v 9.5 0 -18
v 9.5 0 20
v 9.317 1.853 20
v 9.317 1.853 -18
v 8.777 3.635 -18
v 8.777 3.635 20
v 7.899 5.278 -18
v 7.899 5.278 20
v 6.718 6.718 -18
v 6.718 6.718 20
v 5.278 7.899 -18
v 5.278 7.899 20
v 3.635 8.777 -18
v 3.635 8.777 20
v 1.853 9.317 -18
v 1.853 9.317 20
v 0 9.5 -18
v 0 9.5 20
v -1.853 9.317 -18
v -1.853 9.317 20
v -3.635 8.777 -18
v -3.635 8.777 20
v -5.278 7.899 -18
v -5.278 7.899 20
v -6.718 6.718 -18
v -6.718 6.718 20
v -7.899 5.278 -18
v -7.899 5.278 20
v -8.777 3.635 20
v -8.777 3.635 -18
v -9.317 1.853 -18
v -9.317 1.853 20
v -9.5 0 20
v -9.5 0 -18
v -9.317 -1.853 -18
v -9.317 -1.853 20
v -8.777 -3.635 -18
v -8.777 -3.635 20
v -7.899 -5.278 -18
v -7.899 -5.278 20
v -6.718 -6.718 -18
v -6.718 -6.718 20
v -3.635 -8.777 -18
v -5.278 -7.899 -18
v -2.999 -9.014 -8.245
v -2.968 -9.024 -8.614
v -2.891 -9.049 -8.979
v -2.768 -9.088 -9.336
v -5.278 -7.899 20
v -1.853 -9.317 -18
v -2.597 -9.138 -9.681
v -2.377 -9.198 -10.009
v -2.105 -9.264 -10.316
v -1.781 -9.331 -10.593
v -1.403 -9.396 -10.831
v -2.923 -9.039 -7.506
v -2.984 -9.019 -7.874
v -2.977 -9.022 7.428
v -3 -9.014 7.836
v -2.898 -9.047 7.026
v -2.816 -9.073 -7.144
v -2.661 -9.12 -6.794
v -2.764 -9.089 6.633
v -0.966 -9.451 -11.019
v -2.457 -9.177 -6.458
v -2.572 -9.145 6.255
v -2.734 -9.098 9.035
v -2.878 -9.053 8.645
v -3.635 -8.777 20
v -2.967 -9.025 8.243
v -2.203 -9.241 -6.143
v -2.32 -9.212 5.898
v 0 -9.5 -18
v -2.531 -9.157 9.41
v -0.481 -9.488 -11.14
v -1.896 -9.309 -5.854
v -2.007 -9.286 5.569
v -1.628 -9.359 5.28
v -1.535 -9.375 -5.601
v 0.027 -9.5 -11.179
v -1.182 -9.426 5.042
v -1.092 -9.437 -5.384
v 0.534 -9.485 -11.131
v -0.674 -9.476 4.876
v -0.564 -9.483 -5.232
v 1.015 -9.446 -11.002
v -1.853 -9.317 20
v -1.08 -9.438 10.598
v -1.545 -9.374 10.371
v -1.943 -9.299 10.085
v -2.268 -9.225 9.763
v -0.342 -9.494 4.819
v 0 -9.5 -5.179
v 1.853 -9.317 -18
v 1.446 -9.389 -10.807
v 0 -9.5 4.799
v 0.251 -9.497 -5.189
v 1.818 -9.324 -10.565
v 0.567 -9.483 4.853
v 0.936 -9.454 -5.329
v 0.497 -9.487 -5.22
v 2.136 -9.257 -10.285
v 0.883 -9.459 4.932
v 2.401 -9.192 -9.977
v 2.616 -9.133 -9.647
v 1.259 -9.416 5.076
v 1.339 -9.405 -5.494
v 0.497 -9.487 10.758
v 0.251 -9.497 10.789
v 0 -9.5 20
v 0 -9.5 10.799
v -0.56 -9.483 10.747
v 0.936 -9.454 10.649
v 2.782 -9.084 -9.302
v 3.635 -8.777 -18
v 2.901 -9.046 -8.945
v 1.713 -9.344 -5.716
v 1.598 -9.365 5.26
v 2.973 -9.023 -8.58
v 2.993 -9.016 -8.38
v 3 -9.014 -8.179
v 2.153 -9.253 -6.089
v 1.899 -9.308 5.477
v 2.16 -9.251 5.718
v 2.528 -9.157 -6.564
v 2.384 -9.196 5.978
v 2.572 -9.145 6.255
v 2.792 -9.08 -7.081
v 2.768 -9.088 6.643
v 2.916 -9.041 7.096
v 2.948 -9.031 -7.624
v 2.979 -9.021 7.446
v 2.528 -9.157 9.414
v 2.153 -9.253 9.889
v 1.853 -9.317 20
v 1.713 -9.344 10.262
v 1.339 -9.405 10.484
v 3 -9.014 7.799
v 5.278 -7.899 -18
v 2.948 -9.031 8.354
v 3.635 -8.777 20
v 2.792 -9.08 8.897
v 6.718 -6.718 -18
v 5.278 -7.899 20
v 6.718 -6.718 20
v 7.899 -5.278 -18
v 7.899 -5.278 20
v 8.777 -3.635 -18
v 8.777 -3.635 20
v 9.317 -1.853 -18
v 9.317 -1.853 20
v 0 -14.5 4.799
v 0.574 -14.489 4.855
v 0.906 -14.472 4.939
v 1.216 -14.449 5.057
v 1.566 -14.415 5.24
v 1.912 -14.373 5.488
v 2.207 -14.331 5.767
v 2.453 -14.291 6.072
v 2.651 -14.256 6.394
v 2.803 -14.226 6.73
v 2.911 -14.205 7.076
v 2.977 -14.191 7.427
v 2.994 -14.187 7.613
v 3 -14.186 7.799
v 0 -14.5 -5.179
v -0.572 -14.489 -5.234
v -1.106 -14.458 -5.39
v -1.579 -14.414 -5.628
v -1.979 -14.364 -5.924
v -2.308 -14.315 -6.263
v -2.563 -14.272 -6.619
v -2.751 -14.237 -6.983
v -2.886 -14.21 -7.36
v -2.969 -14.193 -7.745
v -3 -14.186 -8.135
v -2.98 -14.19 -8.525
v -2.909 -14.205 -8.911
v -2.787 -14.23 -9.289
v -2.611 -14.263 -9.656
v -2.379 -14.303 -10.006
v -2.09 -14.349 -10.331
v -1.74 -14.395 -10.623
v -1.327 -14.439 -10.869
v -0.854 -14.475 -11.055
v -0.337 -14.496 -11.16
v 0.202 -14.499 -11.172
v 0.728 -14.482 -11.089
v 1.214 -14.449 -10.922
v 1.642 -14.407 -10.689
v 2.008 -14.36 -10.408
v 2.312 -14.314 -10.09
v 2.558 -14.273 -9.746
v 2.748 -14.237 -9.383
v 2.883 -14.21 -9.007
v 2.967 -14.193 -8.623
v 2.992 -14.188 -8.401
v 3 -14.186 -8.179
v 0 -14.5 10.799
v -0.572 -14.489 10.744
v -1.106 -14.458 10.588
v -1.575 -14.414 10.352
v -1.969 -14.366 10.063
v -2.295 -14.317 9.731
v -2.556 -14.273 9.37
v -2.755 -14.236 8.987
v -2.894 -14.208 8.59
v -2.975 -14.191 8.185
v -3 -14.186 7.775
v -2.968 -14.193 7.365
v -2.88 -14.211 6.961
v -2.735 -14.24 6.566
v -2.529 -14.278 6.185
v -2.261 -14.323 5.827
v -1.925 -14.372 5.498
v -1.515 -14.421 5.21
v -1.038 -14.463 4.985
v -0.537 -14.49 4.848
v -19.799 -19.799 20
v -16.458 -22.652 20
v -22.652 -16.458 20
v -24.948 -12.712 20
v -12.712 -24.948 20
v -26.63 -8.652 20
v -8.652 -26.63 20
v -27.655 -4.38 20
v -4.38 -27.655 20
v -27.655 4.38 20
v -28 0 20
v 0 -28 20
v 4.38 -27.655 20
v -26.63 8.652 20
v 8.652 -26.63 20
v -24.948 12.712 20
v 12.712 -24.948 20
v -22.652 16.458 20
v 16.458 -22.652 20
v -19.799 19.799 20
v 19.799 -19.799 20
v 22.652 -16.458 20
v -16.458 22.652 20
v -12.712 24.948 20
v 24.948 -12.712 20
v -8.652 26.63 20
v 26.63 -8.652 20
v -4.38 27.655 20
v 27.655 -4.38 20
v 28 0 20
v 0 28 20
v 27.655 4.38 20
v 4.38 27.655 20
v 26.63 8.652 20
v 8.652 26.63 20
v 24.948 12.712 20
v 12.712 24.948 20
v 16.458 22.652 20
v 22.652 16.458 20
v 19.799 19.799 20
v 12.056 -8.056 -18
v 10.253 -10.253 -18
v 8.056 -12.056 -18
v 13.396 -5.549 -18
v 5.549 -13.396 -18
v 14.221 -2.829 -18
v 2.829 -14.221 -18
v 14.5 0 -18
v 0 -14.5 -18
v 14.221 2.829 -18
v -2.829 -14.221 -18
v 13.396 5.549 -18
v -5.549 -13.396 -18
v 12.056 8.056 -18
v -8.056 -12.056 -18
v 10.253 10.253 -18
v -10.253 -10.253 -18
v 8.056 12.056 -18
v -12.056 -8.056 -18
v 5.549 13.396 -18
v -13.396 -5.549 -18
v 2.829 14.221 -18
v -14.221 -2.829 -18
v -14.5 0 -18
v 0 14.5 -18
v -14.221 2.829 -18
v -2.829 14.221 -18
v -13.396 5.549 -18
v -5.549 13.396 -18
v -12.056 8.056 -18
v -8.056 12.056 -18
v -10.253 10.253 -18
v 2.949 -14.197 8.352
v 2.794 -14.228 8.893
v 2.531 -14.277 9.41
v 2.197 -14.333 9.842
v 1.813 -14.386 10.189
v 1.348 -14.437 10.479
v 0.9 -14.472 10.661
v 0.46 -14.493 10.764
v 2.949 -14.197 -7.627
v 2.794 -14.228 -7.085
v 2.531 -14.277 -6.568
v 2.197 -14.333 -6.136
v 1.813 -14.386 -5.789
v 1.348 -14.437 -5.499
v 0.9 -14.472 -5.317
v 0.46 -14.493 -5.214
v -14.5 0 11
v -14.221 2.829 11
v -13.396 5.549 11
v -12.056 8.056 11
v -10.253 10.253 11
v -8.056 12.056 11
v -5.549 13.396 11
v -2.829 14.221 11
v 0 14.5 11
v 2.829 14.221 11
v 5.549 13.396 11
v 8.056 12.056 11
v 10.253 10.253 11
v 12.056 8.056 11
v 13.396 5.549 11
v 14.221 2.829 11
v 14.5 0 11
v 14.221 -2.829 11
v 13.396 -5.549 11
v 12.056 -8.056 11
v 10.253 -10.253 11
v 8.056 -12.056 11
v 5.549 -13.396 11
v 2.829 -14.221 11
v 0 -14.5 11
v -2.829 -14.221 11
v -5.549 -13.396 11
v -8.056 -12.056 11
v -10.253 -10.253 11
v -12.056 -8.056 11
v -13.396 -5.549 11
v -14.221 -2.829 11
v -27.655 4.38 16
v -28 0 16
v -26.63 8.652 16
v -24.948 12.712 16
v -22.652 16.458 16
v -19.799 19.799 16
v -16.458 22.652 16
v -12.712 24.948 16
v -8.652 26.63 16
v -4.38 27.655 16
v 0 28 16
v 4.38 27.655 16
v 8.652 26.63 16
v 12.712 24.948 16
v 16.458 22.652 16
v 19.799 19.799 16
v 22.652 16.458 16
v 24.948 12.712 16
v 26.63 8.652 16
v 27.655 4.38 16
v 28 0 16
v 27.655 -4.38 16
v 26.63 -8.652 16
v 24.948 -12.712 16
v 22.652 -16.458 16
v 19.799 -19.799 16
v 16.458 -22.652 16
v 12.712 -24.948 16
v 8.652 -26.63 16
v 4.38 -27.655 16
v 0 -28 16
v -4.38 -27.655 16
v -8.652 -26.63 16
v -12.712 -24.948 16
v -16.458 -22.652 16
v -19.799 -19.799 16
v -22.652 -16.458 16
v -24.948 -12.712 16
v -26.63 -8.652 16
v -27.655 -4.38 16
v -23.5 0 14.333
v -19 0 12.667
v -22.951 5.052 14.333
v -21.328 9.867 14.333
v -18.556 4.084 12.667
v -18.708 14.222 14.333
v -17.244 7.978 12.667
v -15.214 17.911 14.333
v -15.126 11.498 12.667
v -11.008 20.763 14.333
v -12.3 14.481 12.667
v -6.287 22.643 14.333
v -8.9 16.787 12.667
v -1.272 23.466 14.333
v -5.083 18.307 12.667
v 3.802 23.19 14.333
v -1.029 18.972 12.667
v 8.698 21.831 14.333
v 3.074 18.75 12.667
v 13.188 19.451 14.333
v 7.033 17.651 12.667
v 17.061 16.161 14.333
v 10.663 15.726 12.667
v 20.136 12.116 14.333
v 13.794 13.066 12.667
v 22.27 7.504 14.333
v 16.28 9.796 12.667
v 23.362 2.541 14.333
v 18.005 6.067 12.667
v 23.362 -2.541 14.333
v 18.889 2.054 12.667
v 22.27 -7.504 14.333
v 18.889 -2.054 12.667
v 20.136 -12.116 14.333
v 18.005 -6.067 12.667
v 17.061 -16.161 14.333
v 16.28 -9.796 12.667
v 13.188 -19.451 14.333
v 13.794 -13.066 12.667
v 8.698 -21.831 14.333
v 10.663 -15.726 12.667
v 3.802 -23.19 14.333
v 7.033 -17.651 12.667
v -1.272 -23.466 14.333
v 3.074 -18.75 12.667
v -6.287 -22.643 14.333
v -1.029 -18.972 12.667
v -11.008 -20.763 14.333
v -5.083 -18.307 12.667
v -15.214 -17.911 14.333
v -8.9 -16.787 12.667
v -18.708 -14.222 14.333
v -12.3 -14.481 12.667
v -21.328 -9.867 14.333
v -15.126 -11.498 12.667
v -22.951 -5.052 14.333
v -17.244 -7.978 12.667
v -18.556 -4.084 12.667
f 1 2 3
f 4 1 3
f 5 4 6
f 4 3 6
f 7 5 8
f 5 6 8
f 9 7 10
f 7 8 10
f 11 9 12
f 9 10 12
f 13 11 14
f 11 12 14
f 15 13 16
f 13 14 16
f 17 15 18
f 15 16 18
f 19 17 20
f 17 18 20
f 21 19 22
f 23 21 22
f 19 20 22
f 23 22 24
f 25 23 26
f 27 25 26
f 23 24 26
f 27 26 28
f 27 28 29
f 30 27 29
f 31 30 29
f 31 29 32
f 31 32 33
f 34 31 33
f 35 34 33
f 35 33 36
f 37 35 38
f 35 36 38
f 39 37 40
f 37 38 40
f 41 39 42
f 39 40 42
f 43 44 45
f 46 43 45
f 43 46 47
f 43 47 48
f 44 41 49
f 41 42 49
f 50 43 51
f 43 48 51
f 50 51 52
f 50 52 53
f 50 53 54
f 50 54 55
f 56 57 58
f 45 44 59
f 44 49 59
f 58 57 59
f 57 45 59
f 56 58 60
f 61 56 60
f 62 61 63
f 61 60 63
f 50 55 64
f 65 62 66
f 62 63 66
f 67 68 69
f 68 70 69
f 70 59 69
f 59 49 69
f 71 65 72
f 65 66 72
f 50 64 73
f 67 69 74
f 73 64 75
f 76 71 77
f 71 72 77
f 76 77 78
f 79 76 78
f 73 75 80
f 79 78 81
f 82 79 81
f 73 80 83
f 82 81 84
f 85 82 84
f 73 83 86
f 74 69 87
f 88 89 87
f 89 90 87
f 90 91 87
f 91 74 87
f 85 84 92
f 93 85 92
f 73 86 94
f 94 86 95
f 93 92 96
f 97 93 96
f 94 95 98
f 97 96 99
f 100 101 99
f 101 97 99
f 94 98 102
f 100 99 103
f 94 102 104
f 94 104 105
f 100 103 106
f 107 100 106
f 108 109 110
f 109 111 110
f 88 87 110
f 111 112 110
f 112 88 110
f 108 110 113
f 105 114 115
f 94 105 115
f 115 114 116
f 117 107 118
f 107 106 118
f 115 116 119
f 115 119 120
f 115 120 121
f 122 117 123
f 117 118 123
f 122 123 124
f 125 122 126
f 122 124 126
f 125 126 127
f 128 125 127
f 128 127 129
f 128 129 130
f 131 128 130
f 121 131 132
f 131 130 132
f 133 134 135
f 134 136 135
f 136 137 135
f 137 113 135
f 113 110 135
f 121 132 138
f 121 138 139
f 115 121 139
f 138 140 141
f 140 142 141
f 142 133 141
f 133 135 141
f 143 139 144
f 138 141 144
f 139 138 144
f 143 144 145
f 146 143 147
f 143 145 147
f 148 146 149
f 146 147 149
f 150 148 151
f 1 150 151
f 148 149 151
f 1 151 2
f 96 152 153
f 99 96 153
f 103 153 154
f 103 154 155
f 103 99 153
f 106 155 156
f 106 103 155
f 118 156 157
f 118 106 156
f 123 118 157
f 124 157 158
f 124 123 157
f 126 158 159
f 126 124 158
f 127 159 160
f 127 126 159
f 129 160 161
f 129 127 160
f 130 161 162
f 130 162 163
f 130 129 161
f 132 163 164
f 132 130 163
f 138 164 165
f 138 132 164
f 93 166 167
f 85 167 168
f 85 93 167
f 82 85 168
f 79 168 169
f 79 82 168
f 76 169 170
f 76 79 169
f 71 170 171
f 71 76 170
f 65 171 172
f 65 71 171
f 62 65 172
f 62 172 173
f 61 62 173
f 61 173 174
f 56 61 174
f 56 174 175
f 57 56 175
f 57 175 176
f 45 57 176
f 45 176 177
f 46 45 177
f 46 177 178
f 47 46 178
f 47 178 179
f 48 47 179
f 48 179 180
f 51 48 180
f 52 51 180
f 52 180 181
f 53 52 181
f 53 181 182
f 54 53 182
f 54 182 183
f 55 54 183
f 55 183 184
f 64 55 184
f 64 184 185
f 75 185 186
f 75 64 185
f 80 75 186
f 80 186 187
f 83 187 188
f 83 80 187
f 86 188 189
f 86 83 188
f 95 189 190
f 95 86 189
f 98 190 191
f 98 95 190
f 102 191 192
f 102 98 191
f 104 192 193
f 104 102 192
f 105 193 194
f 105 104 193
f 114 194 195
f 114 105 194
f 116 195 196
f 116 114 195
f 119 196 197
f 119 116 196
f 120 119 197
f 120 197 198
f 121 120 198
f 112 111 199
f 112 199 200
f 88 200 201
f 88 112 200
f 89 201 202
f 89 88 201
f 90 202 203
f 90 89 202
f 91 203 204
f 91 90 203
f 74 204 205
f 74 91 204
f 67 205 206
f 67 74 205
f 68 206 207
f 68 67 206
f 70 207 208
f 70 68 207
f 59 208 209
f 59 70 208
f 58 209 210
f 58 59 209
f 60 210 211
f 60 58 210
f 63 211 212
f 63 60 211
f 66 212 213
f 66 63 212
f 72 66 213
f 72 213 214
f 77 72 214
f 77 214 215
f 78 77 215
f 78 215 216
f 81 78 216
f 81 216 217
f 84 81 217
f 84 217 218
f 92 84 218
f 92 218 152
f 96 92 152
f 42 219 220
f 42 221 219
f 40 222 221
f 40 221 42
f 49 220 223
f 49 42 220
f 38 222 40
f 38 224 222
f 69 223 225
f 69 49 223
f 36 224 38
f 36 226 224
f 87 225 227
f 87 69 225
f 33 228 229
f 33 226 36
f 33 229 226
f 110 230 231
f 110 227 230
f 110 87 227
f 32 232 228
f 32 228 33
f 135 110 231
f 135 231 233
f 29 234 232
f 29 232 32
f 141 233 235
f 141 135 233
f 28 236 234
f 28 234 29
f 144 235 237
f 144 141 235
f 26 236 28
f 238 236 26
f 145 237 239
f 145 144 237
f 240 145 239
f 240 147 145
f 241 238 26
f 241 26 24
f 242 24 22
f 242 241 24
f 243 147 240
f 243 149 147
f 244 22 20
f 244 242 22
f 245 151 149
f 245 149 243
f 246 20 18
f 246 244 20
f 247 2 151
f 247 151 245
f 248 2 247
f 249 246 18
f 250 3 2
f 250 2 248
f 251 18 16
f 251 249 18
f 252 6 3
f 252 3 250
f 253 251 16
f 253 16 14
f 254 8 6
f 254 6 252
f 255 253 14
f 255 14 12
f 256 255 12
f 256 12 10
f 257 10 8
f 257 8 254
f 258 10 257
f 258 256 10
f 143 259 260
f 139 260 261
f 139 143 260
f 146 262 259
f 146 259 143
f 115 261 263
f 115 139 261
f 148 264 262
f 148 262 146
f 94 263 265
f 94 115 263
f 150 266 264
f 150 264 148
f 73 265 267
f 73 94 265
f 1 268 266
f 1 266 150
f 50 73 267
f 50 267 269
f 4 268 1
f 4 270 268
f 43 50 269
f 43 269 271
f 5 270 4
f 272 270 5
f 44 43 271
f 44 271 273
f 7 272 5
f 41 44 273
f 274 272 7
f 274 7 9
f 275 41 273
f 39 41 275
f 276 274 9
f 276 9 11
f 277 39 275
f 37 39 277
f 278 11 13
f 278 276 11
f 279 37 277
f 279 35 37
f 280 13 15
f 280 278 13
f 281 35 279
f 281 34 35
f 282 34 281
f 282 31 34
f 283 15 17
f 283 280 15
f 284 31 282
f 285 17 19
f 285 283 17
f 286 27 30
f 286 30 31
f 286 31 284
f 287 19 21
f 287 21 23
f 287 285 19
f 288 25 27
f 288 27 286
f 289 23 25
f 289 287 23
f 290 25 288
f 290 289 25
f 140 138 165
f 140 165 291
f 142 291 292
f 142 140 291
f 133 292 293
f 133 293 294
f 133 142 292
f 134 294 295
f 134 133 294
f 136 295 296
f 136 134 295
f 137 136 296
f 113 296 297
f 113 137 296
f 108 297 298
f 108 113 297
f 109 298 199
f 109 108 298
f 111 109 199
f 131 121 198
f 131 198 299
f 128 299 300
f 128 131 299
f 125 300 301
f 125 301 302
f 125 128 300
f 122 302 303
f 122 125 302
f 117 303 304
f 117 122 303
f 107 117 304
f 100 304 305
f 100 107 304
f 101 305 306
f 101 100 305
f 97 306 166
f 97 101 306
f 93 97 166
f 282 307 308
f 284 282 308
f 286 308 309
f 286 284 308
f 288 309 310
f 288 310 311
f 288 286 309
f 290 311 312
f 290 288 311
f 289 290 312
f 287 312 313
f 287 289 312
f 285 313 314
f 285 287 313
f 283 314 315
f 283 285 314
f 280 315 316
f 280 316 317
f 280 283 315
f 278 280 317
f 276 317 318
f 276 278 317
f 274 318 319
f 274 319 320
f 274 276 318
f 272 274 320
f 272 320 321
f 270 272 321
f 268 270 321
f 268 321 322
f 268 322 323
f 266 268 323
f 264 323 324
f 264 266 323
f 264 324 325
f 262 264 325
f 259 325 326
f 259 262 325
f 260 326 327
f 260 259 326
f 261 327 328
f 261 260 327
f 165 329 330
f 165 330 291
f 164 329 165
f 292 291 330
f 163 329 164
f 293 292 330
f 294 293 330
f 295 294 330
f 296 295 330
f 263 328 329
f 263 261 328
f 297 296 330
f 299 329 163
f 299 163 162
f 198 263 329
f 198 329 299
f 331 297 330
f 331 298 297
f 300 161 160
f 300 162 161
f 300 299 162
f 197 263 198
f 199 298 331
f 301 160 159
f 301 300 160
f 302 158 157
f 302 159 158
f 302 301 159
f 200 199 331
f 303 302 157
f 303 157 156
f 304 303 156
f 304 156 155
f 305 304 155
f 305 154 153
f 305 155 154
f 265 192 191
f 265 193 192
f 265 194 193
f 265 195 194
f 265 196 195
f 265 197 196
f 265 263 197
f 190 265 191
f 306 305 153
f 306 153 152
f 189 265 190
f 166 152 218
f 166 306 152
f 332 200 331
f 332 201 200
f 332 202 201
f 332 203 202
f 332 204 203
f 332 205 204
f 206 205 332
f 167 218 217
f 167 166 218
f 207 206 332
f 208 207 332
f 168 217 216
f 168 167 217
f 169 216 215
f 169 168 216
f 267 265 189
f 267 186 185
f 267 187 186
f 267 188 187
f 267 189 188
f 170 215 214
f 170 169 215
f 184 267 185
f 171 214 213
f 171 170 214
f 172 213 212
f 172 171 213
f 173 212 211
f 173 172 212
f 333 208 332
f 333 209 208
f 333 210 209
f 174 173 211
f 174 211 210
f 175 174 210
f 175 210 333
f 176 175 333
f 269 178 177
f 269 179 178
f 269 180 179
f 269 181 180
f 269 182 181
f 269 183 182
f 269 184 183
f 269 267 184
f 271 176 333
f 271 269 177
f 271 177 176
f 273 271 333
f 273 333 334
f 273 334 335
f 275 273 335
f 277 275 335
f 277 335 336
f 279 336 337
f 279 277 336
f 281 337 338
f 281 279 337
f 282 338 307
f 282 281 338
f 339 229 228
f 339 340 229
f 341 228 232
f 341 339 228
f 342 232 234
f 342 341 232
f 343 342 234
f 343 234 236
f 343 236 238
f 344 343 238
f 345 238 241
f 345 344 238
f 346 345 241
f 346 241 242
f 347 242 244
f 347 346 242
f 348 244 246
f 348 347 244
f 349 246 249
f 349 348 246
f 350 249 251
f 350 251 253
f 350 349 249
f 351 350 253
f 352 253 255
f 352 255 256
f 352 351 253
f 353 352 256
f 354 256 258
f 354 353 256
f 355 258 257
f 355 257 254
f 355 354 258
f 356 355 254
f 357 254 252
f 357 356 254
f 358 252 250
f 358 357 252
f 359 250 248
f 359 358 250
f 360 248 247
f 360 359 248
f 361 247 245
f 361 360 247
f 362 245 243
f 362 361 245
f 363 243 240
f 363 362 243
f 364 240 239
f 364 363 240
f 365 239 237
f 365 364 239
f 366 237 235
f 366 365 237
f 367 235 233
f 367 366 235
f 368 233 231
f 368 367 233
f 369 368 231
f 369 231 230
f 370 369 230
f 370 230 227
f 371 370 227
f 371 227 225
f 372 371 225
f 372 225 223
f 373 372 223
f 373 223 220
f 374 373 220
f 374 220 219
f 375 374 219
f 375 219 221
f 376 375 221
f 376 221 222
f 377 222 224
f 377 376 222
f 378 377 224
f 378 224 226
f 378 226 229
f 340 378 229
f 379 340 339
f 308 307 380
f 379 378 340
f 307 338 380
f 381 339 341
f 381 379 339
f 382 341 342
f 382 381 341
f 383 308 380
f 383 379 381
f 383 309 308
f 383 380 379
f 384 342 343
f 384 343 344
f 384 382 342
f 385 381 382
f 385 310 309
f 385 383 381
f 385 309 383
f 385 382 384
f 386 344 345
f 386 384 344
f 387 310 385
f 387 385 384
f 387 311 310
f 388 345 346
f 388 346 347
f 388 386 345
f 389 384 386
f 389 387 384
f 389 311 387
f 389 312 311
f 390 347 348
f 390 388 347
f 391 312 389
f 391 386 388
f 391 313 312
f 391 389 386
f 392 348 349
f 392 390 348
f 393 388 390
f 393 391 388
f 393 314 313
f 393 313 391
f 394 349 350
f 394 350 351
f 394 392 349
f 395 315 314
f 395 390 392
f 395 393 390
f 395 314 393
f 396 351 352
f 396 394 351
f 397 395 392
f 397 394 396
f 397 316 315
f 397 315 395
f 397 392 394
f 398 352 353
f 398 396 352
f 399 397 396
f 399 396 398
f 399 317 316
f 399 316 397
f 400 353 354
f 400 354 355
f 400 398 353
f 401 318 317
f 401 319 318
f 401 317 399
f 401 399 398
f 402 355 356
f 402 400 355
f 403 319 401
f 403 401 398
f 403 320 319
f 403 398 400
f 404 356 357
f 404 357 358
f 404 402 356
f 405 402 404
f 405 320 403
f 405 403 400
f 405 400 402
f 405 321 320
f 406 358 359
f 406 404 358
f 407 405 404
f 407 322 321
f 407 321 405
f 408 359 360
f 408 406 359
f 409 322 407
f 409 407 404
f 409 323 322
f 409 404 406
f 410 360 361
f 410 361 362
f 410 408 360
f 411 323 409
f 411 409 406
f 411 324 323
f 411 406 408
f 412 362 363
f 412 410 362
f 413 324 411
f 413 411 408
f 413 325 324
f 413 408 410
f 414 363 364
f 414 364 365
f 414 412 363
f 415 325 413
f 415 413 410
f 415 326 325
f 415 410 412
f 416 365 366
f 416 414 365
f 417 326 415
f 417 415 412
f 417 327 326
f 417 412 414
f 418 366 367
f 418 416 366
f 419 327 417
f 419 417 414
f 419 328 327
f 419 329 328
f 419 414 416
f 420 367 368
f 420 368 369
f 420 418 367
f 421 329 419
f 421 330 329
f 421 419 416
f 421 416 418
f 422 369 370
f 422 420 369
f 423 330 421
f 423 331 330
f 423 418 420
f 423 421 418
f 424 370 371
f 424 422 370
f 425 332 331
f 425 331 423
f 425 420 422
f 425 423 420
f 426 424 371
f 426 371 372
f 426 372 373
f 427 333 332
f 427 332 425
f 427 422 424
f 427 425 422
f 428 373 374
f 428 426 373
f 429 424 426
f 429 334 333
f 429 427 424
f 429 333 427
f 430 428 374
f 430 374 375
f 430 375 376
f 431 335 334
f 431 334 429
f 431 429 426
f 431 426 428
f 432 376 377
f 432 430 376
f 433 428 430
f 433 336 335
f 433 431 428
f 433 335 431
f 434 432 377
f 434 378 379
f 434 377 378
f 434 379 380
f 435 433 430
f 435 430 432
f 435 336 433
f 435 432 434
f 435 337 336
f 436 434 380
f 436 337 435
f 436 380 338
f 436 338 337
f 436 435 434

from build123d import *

# Parameters (mm, degrees)
F2_R     = 9.5
F3_DEPTH = 50
F5_DEPTH = 30


with BuildPart() as f1:
    # F0 (on Front) → F1 (revolve)
    with BuildSketch(Plane.XZ):
        Polygon((-28, 16), (-14.5, 11), (-14.5, -18), (0, -18), (0, 20), (-28, 20), align=None)
    revolve(axis=Axis((0, 0, 1), (0, 0, -1)))

    # F2 (on Top) → F3 (cut, symmetric)
    with BuildSketch(Plane.XY):
        Circle(F2_R)
    extrude(amount=F3_DEPTH, both=True, mode=Mode.SUBTRACT)

    # F4 (on Front) → F5 (cut)
    with BuildSketch(Plane.XZ):
        with BuildLine():
            ThreePointArc((3, 7.7993366867), (2.1213203436, 9.9206570303), (0, 10.7993366867))
            Line((0, 10.7993366867), (0, 4.7993366867))
            ThreePointArc((0, 4.7993366867), (2.1213203436, 5.6780163432), (3, 7.7993366867))
        make_face()
        with BuildLine():
            ThreePointArc((3, -8.1787835807), (2.1213203436, -6.0574632371), (0, -5.1787835807))
            ThreePointArc((0, -5.1787835807), (-2.1213203436, -10.3001039242), (3, -8.1787835807))
        make_face()
        with BuildLine():
            Line((0, 4.7993366867), (0, 10.7993366867))
            ThreePointArc((0, 10.7993366867), (-3, 7.7993366867), (0, 4.7993366867))
        make_face()
    extrude(amount=F5_DEPTH, mode=Mode.SUBTRACT)


solid = f1.part
